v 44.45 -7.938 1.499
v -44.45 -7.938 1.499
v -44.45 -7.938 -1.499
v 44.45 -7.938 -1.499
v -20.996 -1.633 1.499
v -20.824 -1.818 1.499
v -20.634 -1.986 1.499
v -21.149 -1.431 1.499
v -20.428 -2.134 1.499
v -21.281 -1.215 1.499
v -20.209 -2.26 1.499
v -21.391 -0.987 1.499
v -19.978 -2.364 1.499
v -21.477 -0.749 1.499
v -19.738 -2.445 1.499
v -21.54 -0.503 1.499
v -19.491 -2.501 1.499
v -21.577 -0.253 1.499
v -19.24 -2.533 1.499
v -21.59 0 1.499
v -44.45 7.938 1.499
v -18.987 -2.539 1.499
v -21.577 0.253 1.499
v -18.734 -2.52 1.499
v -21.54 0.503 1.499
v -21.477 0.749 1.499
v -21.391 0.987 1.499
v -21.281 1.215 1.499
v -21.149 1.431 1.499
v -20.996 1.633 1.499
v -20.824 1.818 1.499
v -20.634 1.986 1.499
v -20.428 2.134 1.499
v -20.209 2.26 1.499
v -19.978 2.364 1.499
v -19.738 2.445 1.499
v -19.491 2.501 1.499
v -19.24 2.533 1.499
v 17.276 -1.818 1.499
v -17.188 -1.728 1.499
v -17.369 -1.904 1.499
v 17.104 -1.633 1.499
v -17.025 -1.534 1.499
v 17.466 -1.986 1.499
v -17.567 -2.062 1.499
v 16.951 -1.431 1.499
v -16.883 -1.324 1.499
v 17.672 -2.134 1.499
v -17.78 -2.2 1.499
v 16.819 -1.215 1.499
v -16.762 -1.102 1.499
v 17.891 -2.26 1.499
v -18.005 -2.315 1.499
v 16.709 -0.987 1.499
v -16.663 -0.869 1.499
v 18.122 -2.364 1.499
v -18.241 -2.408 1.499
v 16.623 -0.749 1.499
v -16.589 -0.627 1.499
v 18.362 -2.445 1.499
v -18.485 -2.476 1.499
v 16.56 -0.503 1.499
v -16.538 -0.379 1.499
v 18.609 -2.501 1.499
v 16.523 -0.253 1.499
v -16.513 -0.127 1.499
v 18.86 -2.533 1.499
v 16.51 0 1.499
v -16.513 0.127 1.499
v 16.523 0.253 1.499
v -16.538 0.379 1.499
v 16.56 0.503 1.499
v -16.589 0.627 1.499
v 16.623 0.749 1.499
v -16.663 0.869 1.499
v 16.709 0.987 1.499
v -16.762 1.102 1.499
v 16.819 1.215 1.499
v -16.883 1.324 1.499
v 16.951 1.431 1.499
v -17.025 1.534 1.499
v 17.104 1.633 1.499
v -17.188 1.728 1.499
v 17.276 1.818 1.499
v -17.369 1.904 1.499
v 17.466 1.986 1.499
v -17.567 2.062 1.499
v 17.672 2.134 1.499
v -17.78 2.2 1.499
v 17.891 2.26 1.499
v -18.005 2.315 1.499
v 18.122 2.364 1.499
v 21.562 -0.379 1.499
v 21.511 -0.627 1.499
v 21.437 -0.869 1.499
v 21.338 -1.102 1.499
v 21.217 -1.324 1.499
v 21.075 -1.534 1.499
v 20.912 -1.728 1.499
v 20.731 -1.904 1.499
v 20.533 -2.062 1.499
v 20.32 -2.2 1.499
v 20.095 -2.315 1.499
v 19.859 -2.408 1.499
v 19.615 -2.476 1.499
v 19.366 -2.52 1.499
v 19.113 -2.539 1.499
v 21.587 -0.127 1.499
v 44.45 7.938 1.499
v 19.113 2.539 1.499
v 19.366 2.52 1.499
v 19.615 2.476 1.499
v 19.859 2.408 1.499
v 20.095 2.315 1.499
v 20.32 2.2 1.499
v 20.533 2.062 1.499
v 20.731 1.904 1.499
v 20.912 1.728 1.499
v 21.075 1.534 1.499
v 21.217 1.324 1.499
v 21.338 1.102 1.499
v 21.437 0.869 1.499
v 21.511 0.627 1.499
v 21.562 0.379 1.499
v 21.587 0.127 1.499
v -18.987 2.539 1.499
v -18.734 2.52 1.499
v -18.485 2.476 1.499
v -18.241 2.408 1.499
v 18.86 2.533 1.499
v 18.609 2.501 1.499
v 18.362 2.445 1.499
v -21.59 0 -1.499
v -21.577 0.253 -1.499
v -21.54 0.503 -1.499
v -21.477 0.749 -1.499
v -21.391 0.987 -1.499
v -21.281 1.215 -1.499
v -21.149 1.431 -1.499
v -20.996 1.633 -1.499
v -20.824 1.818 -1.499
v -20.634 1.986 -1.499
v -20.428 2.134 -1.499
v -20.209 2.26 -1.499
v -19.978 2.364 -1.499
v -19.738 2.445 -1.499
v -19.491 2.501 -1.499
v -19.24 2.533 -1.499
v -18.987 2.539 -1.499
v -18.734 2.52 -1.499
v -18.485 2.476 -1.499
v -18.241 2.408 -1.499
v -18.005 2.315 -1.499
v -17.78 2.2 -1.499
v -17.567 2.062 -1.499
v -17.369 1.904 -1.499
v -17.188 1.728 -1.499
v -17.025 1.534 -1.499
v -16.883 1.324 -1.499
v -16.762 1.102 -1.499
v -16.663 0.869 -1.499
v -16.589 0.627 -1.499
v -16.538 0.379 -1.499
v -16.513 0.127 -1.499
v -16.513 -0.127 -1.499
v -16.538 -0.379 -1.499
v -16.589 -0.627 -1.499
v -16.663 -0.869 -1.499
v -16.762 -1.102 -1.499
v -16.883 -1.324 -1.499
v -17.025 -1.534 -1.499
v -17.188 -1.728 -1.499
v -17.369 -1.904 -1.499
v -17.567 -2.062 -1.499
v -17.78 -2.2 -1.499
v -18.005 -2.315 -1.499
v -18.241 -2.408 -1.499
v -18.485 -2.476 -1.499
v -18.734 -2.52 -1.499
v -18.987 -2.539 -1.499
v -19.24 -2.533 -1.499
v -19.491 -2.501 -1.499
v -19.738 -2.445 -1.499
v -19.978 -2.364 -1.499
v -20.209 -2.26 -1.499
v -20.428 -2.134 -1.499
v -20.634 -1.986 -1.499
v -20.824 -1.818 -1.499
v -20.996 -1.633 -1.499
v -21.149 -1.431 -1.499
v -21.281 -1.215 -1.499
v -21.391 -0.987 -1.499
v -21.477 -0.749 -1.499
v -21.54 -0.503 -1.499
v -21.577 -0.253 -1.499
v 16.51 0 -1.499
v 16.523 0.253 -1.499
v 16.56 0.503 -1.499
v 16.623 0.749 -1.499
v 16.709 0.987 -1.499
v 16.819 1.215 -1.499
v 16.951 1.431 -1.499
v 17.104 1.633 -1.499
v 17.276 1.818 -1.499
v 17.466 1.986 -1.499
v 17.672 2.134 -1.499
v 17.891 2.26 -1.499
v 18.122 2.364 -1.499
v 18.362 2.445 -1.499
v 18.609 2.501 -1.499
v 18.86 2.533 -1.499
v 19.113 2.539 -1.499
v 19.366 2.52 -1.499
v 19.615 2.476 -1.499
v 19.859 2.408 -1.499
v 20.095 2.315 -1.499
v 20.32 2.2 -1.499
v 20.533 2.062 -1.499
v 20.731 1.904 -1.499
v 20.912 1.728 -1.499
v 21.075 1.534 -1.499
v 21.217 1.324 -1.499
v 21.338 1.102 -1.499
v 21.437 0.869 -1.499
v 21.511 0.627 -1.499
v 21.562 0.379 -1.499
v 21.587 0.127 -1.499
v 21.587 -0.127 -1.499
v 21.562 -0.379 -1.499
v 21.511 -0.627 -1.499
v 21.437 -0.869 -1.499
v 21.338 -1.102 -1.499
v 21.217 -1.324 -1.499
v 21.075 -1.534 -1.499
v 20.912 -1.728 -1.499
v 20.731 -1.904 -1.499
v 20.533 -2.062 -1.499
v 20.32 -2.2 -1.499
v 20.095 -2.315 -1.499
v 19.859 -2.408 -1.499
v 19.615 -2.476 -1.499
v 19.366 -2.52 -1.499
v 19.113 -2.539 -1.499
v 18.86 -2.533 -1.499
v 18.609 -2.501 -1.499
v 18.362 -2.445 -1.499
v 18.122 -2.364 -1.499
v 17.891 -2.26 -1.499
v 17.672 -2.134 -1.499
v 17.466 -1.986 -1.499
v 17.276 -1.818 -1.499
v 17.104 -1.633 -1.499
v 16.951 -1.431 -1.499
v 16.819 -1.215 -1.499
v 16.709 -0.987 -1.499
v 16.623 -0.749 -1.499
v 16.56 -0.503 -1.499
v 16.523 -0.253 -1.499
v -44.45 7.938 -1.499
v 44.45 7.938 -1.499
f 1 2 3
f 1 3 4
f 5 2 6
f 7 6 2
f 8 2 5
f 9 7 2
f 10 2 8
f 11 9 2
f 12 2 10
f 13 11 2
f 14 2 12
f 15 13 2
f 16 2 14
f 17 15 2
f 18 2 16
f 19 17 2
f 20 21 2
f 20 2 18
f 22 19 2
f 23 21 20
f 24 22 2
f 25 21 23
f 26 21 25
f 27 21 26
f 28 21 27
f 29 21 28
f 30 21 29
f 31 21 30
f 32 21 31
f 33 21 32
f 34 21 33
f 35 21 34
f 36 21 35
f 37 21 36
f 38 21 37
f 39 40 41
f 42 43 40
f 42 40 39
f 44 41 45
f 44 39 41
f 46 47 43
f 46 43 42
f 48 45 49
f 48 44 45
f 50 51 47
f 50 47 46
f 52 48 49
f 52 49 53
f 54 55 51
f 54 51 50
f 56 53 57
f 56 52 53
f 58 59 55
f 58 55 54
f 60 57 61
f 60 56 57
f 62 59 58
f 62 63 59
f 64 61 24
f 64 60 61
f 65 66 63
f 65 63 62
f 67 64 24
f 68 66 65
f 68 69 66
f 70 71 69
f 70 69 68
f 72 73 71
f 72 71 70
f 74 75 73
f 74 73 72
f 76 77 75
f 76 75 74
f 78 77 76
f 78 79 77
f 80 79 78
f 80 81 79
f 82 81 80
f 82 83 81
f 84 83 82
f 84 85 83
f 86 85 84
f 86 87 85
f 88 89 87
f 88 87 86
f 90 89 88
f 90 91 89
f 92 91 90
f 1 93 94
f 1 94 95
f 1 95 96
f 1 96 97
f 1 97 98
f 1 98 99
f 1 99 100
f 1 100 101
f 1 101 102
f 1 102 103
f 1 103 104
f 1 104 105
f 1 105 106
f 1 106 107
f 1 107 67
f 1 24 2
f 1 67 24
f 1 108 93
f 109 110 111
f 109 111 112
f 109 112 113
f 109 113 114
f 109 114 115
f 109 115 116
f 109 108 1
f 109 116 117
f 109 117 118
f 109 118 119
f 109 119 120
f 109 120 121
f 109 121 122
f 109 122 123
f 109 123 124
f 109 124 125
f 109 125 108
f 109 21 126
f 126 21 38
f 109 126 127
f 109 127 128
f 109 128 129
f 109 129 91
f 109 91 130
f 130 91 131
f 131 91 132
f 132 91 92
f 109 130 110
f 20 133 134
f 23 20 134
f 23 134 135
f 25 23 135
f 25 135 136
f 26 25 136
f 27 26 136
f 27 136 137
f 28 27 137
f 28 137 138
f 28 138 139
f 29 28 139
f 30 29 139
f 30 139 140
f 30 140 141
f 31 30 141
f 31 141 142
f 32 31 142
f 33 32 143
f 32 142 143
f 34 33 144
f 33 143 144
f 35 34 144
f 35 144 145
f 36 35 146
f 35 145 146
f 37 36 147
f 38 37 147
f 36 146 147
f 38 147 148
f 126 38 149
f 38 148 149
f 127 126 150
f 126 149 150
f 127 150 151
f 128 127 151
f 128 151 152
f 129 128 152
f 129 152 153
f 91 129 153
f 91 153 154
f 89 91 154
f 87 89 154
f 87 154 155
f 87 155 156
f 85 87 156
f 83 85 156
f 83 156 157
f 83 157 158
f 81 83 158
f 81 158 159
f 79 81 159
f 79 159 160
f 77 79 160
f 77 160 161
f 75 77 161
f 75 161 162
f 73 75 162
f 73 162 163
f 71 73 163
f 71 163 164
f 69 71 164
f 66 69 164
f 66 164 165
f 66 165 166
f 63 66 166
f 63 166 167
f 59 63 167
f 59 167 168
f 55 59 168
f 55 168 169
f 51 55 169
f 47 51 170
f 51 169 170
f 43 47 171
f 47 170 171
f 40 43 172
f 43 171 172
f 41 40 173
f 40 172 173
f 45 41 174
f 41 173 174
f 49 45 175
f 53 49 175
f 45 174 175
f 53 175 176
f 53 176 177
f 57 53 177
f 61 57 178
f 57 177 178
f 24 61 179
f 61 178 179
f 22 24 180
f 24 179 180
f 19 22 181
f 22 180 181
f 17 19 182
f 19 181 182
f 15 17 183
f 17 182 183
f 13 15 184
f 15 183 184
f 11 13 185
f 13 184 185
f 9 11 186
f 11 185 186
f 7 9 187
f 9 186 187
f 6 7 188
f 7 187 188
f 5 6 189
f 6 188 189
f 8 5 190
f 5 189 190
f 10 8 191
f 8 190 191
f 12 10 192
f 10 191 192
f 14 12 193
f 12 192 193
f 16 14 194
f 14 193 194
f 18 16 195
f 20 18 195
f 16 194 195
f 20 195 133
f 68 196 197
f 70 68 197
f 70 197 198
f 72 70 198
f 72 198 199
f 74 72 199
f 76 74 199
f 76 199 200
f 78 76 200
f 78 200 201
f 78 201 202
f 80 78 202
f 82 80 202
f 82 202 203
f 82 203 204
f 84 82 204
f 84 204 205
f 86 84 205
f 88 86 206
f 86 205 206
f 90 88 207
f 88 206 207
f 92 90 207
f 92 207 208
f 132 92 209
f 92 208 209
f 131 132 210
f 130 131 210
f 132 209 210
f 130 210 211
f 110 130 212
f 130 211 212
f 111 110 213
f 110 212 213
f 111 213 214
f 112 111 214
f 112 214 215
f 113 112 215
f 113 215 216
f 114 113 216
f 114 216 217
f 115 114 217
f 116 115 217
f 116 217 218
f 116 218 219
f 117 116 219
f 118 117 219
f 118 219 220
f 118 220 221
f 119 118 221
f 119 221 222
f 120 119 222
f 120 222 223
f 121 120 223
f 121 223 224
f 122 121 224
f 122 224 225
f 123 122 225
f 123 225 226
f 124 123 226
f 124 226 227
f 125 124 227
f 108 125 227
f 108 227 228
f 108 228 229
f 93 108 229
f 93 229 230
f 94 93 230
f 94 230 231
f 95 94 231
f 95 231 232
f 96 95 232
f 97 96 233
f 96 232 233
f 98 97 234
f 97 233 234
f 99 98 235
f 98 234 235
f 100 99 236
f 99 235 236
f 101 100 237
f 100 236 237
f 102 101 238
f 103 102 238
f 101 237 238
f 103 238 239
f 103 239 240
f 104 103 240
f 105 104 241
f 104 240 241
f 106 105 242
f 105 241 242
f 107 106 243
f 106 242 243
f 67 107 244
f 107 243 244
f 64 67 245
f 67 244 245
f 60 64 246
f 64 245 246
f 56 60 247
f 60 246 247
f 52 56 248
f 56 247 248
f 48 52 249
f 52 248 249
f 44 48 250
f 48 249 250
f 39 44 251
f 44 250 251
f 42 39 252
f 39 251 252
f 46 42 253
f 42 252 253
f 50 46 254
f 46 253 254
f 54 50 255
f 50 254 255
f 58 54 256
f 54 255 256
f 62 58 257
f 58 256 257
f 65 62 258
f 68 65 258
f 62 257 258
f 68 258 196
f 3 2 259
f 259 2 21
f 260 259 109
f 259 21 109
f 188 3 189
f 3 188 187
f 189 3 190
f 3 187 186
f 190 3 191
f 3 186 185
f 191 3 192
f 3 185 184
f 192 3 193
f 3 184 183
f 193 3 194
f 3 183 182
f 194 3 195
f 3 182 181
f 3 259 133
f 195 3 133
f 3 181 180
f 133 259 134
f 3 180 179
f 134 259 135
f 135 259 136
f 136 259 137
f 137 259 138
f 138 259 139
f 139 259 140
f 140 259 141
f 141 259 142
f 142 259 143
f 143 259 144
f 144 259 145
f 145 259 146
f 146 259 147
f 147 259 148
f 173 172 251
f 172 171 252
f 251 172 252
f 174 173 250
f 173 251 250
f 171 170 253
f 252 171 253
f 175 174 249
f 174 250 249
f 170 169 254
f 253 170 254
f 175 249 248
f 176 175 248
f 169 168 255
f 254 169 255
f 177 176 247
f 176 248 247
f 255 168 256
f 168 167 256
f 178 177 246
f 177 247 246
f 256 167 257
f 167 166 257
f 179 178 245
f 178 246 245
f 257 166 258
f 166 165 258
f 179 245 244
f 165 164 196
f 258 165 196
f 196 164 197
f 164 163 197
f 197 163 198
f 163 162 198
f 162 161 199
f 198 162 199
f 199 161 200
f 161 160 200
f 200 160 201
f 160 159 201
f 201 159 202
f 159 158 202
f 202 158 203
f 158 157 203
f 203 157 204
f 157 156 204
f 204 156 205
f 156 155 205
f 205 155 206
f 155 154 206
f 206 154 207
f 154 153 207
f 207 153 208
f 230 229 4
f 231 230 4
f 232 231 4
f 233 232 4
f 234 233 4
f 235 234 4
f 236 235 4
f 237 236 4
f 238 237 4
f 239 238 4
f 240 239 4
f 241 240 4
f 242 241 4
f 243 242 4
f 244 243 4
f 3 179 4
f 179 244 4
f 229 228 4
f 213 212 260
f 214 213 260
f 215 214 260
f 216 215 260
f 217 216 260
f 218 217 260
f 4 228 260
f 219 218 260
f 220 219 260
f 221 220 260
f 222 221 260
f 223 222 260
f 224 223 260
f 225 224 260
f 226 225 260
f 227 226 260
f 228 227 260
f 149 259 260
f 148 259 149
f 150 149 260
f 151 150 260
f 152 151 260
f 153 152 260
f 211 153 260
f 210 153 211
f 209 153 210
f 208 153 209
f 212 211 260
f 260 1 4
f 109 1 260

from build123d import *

# Parameters (mm, degrees)
SKETCH1_W           = 88.9
SKETCH1_H           = 15.875
BOSS_EXTRUDE1_DEPTH = 1.4986
SKETCH2_R           = 2.54
CUT_EXTRUDE1_DEPTH  = 3.9972


with BuildPart() as part:
    # Sketch1 → Boss-Extrude1 (new body, symmetric)
    with BuildSketch(Plane.XY):
        Rectangle(SKETCH1_W, SKETCH1_H)
    extrude(amount=BOSS_EXTRUDE1_DEPTH, both=True)

    # Sketch2 → Cut-Extrude1 (cut, through all)
    with BuildSketch(Plane(origin=(0, 0, -1.4986), x_dir=(-1, 0, 0), z_dir=(0, 0, -1))):
        with Locations((-19.05, 0)):
            Circle(SKETCH2_R)
        with Locations((19.05, 0)):
            Circle(SKETCH2_R)
    extrude(amount=-CUT_EXTRUDE1_DEPTH, mode=Mode.SUBTRACT)


solid = part.part
